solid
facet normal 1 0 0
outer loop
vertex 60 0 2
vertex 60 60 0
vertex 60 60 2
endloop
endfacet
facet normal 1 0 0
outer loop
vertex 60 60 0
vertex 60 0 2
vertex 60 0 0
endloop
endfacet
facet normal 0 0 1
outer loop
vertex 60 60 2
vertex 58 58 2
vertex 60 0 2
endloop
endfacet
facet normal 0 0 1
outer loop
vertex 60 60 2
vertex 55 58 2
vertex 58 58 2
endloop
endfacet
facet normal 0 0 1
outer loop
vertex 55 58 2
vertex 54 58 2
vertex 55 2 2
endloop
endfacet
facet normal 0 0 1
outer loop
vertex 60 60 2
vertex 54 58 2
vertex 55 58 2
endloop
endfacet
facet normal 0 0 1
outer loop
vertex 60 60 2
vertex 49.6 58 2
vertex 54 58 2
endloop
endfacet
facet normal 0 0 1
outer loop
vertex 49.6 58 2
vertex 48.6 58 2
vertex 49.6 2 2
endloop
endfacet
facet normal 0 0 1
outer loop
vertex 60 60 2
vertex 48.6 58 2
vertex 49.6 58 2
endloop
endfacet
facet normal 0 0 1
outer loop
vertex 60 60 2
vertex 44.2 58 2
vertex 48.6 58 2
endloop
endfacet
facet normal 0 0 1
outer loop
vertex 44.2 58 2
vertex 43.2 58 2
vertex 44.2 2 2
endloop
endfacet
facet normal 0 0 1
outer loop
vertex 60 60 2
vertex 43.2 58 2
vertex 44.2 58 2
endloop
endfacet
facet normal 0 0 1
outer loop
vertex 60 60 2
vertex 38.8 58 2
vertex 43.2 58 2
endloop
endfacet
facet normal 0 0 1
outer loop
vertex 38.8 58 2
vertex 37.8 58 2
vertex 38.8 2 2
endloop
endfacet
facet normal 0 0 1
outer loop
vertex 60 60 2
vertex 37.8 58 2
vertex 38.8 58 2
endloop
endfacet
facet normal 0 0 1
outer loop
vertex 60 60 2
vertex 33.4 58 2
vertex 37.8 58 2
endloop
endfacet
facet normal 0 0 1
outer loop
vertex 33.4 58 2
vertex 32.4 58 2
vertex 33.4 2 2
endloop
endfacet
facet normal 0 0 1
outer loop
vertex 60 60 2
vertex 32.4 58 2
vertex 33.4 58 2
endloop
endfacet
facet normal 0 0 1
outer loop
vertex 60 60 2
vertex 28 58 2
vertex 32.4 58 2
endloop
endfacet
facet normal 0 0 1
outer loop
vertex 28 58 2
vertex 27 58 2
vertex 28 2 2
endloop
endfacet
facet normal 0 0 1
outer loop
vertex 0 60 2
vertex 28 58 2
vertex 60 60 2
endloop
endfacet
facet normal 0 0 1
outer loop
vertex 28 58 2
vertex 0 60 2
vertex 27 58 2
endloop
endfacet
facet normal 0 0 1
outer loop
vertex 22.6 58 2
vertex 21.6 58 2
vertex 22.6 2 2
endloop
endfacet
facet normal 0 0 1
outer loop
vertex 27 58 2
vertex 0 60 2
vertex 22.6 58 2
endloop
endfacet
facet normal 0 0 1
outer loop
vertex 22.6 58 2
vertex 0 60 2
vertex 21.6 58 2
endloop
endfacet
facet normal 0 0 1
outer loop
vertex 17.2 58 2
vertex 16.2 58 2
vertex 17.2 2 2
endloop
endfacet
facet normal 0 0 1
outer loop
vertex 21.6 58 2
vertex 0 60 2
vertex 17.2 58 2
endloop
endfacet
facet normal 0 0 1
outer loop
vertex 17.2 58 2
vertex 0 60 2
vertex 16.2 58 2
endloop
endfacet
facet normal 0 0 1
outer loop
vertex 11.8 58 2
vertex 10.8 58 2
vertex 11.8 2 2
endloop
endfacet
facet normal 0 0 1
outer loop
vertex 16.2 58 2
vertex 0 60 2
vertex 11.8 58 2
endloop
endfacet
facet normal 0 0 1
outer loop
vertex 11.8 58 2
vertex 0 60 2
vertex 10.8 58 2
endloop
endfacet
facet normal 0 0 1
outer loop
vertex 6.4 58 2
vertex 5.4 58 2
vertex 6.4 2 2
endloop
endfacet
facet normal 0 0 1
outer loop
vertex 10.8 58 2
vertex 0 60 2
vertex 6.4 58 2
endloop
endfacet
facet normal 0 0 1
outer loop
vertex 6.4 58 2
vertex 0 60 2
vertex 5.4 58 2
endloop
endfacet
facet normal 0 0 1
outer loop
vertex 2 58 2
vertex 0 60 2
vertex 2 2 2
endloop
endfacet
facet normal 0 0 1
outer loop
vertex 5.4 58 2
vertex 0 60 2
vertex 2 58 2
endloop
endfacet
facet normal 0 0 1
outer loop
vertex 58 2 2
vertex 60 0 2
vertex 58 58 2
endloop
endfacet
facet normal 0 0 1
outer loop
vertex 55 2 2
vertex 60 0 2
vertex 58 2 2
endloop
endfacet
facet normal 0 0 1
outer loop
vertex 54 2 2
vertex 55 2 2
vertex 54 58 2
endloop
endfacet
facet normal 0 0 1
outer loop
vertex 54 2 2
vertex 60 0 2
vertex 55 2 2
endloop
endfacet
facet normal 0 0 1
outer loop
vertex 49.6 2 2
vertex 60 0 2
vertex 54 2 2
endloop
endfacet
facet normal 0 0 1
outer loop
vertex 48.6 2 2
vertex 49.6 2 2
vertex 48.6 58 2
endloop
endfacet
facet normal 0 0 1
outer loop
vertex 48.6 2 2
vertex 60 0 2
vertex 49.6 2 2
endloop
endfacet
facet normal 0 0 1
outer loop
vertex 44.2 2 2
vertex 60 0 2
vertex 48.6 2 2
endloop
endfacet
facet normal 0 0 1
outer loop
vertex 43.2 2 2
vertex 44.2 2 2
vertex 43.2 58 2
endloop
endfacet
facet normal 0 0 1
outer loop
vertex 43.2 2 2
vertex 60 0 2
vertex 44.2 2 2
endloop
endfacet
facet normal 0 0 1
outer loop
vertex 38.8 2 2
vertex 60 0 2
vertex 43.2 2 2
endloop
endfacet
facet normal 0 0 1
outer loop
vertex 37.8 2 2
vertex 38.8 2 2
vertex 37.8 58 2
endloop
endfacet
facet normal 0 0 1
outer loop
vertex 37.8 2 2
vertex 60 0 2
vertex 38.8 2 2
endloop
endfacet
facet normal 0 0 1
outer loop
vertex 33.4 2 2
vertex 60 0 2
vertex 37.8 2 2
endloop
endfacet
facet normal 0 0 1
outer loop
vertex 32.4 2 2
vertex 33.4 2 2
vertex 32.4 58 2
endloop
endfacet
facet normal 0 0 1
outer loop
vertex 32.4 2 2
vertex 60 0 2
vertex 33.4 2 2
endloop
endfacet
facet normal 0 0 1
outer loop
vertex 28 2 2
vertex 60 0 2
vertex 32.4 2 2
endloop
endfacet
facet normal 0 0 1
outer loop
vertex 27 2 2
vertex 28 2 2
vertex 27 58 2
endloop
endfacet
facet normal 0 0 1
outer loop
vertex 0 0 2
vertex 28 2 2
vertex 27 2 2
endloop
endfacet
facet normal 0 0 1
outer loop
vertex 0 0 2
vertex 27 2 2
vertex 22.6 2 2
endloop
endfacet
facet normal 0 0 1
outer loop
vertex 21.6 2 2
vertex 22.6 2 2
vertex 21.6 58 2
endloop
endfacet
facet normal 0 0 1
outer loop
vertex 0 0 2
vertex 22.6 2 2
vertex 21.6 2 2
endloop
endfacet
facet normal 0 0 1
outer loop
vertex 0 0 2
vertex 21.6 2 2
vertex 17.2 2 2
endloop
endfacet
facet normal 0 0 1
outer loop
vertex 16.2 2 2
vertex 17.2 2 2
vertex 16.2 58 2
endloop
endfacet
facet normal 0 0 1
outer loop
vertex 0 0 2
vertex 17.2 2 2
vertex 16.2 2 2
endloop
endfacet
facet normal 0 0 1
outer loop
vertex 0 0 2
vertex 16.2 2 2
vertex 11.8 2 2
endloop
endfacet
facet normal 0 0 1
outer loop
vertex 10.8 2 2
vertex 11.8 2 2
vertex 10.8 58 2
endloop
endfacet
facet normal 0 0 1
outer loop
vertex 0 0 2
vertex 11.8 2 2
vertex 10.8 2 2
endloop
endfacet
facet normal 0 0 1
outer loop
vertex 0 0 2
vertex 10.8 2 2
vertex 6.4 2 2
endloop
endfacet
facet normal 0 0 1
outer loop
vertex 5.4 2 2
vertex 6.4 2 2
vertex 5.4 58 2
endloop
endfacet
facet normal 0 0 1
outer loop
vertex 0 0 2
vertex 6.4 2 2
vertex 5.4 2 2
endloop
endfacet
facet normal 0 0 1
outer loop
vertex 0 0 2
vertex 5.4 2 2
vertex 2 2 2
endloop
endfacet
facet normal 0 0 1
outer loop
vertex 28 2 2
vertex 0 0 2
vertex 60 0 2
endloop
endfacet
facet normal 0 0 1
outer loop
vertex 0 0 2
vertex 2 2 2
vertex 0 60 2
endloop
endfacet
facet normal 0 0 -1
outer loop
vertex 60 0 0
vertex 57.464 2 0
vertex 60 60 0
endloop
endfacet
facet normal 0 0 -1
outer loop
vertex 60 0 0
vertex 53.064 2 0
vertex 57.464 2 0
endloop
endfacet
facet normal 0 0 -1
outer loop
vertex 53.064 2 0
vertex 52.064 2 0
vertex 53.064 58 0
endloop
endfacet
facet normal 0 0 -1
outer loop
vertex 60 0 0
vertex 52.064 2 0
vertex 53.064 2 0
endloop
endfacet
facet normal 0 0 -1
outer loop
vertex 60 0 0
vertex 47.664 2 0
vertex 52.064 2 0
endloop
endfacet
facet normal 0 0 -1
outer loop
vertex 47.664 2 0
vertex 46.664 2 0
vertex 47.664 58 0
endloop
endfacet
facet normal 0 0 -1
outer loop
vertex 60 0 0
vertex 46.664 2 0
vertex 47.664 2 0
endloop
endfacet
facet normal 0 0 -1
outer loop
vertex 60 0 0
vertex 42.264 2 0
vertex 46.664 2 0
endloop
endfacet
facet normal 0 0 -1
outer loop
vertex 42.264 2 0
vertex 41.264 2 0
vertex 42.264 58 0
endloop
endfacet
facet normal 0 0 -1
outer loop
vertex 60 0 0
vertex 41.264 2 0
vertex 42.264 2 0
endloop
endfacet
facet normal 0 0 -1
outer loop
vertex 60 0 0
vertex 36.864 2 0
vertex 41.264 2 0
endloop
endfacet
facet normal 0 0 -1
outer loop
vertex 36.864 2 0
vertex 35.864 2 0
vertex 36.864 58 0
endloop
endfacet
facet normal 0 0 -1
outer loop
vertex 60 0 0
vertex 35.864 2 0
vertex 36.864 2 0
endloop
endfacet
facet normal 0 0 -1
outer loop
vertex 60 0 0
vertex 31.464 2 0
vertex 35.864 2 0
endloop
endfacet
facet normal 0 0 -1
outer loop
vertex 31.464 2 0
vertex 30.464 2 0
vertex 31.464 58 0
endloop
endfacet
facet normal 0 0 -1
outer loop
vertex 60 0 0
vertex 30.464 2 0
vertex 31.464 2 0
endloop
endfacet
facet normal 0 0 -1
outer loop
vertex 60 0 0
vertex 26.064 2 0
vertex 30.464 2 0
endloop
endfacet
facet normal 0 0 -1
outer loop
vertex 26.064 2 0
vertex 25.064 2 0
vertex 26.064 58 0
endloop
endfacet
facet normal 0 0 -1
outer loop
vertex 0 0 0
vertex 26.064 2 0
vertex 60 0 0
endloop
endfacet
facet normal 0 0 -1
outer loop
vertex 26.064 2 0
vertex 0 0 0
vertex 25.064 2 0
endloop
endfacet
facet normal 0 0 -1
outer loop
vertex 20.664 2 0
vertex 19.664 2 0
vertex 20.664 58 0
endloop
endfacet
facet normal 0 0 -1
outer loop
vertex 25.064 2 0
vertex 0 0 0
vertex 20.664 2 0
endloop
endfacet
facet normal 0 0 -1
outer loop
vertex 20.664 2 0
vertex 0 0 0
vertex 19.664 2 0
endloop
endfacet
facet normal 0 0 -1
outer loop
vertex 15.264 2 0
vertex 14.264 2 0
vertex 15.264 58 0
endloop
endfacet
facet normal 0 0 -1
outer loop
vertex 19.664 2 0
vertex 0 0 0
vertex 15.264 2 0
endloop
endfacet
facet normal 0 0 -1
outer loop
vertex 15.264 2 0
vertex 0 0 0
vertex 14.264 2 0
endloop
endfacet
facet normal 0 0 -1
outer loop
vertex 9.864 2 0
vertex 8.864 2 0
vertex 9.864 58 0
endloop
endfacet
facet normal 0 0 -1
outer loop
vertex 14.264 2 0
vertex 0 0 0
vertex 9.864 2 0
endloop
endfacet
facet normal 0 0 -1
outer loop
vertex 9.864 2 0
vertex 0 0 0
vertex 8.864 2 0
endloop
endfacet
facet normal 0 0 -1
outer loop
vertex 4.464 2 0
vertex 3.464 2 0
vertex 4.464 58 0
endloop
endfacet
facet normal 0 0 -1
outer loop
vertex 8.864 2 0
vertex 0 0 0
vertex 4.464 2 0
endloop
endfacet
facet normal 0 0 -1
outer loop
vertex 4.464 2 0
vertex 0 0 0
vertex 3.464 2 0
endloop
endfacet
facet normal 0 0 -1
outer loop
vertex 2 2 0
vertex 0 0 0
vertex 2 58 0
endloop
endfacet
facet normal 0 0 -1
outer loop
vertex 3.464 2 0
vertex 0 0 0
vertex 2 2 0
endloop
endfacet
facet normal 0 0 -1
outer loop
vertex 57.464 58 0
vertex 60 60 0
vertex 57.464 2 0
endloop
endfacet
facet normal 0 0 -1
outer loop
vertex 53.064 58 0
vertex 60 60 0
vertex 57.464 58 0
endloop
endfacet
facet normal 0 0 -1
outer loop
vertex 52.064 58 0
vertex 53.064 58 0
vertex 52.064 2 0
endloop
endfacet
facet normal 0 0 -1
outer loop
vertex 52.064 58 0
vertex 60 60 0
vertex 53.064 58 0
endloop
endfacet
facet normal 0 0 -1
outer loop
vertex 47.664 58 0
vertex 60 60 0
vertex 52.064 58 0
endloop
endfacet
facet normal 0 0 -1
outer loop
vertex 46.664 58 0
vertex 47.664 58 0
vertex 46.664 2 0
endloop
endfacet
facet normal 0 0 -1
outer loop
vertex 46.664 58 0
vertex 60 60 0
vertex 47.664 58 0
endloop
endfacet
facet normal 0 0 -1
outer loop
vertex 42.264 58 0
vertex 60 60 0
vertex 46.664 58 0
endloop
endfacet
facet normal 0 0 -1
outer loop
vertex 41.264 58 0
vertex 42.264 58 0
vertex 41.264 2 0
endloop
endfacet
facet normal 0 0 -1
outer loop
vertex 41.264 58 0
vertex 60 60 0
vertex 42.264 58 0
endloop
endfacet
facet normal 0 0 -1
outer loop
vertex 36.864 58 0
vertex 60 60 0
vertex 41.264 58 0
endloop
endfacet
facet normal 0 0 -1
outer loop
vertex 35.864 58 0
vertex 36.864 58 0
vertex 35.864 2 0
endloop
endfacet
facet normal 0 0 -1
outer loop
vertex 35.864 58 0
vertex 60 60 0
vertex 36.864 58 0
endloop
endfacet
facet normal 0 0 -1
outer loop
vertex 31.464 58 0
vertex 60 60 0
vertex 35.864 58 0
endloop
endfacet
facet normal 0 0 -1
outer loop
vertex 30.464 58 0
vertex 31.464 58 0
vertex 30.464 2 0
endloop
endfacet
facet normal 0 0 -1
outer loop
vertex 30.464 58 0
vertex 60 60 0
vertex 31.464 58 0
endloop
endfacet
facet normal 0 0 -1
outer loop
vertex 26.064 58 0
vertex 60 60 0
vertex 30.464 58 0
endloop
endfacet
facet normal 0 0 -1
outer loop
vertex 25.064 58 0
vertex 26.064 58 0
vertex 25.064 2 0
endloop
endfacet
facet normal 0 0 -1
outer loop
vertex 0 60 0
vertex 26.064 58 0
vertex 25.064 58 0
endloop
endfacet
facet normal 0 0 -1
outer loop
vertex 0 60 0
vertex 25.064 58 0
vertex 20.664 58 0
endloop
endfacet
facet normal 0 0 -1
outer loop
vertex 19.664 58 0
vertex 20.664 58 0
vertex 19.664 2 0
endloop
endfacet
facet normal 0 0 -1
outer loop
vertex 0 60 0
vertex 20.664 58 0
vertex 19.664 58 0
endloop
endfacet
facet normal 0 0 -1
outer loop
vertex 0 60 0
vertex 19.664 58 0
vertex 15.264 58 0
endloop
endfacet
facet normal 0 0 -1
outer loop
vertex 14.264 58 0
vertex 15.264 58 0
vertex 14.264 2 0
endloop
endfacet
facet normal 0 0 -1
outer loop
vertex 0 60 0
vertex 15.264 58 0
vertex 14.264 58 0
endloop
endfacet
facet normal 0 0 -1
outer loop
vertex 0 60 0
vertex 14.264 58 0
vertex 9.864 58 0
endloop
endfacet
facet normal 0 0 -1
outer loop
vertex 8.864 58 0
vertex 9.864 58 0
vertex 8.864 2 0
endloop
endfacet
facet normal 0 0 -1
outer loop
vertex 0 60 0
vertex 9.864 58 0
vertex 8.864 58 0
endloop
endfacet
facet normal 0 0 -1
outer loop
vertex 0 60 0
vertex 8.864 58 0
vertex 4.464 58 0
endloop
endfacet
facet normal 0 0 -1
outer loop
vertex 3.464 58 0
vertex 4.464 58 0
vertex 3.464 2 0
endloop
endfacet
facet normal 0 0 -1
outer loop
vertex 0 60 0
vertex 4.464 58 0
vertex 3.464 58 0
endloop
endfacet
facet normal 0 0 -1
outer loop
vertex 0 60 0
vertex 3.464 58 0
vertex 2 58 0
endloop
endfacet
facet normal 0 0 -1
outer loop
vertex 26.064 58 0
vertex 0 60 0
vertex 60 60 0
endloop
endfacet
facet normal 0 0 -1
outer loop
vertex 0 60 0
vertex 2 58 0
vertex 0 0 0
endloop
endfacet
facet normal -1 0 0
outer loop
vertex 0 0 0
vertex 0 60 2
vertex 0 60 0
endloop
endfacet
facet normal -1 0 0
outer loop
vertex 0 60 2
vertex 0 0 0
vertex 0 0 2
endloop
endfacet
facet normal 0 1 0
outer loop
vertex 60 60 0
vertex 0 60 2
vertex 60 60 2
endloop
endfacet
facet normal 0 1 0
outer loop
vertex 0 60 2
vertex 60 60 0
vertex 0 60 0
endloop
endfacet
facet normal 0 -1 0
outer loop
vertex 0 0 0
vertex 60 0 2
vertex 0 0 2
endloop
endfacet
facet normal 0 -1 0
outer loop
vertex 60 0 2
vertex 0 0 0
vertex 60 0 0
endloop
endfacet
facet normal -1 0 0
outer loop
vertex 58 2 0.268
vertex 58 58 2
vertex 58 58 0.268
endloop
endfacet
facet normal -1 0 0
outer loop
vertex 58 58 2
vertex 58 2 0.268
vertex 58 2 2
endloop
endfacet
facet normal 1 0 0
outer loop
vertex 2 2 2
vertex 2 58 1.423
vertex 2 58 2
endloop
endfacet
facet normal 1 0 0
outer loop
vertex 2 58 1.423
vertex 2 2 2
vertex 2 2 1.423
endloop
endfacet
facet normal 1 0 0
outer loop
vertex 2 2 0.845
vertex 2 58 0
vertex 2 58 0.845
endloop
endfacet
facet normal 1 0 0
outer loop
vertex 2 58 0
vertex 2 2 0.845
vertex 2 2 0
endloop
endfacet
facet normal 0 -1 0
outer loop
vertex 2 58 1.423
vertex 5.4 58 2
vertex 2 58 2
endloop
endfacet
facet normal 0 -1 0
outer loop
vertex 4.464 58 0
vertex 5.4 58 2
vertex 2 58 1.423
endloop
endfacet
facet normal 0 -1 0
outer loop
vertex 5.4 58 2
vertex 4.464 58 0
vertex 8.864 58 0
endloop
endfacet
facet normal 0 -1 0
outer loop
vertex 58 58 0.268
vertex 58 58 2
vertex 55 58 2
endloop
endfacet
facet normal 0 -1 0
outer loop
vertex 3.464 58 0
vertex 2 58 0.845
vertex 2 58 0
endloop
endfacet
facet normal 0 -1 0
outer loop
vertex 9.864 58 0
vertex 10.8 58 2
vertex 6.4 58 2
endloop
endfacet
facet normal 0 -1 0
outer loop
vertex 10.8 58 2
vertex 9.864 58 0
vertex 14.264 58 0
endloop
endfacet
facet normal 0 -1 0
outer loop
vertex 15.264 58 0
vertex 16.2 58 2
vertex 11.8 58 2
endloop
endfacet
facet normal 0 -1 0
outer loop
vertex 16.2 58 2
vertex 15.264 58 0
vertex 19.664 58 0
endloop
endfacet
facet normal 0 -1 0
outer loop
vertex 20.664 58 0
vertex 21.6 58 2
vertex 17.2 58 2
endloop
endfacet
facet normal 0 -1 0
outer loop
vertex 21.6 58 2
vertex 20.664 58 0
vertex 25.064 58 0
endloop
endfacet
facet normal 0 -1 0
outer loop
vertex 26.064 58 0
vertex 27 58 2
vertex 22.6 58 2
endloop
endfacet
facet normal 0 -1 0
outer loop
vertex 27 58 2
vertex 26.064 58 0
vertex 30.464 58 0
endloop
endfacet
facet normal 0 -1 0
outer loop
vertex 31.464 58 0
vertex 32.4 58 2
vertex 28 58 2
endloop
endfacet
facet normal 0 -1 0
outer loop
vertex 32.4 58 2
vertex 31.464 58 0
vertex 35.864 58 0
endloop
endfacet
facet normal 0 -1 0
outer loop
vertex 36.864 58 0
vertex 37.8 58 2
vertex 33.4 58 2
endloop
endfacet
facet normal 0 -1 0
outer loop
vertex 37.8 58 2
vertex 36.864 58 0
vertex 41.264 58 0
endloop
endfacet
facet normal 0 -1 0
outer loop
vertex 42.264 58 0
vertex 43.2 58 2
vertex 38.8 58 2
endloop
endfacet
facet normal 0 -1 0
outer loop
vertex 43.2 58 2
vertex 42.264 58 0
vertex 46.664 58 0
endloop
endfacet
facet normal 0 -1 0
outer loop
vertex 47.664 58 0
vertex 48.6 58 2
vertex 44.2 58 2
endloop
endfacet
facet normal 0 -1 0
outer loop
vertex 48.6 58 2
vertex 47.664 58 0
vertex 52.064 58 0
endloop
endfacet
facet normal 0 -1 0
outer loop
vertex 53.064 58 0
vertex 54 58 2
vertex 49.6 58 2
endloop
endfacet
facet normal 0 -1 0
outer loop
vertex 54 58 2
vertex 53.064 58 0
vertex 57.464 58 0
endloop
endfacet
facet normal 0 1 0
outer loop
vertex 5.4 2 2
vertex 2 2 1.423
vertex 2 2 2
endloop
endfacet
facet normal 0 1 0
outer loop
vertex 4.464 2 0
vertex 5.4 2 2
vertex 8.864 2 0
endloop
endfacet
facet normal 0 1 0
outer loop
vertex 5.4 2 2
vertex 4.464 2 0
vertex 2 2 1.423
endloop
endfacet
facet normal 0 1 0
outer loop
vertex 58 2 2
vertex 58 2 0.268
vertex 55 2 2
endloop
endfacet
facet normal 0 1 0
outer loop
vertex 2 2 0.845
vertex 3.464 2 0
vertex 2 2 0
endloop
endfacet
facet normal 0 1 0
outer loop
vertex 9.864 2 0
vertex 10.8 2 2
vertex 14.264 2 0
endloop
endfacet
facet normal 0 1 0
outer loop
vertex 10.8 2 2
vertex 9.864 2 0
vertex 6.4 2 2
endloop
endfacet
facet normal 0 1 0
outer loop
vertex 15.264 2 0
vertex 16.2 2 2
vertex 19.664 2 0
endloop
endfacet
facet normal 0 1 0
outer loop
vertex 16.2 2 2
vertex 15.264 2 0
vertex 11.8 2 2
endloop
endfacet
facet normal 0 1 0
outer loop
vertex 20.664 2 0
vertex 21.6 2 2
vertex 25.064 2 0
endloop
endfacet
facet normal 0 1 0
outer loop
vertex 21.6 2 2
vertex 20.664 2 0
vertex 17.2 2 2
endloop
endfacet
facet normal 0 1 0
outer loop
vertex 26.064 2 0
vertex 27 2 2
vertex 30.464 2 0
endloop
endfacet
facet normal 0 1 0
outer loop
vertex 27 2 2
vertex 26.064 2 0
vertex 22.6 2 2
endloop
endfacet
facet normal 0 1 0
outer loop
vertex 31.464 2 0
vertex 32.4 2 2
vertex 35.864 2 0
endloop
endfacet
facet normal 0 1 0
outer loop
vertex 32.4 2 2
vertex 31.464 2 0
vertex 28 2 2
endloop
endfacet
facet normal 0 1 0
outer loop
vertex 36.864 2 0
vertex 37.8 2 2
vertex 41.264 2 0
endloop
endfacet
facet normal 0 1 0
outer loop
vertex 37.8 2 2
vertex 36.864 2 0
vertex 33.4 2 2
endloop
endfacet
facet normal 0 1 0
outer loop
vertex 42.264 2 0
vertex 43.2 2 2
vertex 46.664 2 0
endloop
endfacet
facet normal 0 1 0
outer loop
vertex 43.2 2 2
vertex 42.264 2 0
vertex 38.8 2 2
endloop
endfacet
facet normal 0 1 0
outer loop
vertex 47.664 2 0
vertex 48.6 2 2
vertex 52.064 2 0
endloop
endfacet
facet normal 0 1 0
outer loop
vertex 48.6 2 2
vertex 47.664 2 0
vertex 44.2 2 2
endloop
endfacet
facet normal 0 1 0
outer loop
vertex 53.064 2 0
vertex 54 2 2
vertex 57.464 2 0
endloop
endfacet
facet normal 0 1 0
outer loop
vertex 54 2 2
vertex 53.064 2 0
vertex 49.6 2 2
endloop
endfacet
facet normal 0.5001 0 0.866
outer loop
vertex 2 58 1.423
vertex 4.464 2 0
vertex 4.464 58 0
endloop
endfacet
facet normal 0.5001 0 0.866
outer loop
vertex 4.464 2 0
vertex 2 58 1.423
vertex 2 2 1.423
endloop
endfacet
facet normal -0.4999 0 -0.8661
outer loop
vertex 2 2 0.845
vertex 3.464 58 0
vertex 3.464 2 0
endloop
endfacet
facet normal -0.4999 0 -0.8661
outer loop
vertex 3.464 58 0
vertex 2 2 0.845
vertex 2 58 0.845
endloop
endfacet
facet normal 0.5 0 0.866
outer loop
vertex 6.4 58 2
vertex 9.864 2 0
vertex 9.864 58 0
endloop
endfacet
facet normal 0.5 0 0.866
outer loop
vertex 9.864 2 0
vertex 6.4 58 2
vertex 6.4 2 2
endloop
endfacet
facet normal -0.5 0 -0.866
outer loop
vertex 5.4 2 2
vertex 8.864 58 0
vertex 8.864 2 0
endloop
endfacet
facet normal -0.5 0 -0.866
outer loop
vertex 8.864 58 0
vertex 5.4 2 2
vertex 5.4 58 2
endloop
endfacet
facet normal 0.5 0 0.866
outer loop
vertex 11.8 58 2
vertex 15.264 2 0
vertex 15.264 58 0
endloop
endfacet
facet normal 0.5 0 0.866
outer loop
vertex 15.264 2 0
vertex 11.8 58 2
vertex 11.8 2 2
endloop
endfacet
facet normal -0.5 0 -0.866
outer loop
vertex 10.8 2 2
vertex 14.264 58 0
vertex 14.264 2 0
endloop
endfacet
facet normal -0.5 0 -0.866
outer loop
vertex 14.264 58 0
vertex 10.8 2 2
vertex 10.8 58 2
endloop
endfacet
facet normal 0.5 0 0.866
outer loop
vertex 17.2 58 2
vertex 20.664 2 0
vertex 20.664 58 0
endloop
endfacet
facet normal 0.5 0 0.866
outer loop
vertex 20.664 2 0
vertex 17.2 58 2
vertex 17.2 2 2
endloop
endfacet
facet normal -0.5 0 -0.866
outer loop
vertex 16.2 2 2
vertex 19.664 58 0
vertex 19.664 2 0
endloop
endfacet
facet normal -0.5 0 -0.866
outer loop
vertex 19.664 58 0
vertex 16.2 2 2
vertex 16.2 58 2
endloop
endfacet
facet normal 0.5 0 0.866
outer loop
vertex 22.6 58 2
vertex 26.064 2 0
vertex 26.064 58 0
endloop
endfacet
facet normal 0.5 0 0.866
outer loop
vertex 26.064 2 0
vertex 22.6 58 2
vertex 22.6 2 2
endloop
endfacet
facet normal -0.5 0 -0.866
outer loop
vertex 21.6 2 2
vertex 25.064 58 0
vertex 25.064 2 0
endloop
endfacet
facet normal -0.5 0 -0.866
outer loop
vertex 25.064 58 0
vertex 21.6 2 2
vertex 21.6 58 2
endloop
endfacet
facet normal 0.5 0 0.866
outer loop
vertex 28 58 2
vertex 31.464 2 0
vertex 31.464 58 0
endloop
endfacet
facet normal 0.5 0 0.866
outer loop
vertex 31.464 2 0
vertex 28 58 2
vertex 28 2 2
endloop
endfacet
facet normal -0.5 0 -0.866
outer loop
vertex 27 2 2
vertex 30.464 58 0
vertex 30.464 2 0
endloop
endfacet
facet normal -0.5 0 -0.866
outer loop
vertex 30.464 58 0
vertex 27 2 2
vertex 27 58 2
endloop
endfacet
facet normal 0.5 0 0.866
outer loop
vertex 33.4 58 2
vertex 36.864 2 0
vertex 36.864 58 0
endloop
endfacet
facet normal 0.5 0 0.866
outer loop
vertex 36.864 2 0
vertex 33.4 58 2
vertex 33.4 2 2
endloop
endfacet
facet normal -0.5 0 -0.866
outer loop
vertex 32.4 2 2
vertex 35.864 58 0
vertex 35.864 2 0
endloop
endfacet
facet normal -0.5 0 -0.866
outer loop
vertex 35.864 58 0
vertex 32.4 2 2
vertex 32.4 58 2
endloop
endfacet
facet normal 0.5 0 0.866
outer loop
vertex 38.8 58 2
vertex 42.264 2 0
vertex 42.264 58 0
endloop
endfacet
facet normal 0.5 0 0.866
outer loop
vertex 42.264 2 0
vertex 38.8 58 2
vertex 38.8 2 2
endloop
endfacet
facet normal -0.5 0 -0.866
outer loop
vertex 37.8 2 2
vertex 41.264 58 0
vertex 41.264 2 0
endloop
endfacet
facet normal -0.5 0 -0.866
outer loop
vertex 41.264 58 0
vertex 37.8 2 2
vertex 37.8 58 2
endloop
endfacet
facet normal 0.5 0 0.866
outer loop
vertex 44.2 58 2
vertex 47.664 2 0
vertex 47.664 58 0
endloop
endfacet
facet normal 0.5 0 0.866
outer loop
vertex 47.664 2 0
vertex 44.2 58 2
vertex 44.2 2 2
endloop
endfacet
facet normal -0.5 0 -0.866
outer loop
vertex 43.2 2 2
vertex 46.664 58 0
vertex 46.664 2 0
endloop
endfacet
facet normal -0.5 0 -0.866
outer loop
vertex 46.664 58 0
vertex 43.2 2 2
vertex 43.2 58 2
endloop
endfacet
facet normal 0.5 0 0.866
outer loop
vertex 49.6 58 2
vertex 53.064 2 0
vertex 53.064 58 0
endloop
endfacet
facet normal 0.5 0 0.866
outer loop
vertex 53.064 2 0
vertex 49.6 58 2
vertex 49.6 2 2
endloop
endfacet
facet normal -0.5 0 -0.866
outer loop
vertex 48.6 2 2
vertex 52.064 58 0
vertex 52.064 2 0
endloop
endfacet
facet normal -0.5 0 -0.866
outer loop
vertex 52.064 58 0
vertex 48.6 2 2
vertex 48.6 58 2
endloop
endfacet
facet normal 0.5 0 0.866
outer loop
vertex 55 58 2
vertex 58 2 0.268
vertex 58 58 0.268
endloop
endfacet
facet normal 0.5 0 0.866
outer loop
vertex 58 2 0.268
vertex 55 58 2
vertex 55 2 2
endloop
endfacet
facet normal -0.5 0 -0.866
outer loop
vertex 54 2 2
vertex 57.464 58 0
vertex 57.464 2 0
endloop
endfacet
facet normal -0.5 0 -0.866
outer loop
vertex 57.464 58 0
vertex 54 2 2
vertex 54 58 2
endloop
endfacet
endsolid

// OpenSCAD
longueur=60;

module grilleVentilo(){
    difference(){
        union(){
            // Contours
            difference(){
                cube([longueur,longueur,2]);
                translate([2,2,-1]){
                    cube([longueur-4,longueur-4,6]);
                }
            }
            
            // Lames
            nbLames=10;
            ecart=(longueur-4-2)/nbLames;
            for(i=[0:1:nbLames]){
                translate([i*ecart,0,2]){
                    rotate([0,30,0]){
                        cube([5.65,longueur,.5]);
                    }
                }
            }
        }
        // Couper restes lames
        translate([-1,-1,2]){
            cube([longueur+2,longueur+2,3]);
        }
        translate([0,-1,-2]){
            cube([longueur+2,longueur+2,2]);
        }
    }
}

grilleVentilo();
